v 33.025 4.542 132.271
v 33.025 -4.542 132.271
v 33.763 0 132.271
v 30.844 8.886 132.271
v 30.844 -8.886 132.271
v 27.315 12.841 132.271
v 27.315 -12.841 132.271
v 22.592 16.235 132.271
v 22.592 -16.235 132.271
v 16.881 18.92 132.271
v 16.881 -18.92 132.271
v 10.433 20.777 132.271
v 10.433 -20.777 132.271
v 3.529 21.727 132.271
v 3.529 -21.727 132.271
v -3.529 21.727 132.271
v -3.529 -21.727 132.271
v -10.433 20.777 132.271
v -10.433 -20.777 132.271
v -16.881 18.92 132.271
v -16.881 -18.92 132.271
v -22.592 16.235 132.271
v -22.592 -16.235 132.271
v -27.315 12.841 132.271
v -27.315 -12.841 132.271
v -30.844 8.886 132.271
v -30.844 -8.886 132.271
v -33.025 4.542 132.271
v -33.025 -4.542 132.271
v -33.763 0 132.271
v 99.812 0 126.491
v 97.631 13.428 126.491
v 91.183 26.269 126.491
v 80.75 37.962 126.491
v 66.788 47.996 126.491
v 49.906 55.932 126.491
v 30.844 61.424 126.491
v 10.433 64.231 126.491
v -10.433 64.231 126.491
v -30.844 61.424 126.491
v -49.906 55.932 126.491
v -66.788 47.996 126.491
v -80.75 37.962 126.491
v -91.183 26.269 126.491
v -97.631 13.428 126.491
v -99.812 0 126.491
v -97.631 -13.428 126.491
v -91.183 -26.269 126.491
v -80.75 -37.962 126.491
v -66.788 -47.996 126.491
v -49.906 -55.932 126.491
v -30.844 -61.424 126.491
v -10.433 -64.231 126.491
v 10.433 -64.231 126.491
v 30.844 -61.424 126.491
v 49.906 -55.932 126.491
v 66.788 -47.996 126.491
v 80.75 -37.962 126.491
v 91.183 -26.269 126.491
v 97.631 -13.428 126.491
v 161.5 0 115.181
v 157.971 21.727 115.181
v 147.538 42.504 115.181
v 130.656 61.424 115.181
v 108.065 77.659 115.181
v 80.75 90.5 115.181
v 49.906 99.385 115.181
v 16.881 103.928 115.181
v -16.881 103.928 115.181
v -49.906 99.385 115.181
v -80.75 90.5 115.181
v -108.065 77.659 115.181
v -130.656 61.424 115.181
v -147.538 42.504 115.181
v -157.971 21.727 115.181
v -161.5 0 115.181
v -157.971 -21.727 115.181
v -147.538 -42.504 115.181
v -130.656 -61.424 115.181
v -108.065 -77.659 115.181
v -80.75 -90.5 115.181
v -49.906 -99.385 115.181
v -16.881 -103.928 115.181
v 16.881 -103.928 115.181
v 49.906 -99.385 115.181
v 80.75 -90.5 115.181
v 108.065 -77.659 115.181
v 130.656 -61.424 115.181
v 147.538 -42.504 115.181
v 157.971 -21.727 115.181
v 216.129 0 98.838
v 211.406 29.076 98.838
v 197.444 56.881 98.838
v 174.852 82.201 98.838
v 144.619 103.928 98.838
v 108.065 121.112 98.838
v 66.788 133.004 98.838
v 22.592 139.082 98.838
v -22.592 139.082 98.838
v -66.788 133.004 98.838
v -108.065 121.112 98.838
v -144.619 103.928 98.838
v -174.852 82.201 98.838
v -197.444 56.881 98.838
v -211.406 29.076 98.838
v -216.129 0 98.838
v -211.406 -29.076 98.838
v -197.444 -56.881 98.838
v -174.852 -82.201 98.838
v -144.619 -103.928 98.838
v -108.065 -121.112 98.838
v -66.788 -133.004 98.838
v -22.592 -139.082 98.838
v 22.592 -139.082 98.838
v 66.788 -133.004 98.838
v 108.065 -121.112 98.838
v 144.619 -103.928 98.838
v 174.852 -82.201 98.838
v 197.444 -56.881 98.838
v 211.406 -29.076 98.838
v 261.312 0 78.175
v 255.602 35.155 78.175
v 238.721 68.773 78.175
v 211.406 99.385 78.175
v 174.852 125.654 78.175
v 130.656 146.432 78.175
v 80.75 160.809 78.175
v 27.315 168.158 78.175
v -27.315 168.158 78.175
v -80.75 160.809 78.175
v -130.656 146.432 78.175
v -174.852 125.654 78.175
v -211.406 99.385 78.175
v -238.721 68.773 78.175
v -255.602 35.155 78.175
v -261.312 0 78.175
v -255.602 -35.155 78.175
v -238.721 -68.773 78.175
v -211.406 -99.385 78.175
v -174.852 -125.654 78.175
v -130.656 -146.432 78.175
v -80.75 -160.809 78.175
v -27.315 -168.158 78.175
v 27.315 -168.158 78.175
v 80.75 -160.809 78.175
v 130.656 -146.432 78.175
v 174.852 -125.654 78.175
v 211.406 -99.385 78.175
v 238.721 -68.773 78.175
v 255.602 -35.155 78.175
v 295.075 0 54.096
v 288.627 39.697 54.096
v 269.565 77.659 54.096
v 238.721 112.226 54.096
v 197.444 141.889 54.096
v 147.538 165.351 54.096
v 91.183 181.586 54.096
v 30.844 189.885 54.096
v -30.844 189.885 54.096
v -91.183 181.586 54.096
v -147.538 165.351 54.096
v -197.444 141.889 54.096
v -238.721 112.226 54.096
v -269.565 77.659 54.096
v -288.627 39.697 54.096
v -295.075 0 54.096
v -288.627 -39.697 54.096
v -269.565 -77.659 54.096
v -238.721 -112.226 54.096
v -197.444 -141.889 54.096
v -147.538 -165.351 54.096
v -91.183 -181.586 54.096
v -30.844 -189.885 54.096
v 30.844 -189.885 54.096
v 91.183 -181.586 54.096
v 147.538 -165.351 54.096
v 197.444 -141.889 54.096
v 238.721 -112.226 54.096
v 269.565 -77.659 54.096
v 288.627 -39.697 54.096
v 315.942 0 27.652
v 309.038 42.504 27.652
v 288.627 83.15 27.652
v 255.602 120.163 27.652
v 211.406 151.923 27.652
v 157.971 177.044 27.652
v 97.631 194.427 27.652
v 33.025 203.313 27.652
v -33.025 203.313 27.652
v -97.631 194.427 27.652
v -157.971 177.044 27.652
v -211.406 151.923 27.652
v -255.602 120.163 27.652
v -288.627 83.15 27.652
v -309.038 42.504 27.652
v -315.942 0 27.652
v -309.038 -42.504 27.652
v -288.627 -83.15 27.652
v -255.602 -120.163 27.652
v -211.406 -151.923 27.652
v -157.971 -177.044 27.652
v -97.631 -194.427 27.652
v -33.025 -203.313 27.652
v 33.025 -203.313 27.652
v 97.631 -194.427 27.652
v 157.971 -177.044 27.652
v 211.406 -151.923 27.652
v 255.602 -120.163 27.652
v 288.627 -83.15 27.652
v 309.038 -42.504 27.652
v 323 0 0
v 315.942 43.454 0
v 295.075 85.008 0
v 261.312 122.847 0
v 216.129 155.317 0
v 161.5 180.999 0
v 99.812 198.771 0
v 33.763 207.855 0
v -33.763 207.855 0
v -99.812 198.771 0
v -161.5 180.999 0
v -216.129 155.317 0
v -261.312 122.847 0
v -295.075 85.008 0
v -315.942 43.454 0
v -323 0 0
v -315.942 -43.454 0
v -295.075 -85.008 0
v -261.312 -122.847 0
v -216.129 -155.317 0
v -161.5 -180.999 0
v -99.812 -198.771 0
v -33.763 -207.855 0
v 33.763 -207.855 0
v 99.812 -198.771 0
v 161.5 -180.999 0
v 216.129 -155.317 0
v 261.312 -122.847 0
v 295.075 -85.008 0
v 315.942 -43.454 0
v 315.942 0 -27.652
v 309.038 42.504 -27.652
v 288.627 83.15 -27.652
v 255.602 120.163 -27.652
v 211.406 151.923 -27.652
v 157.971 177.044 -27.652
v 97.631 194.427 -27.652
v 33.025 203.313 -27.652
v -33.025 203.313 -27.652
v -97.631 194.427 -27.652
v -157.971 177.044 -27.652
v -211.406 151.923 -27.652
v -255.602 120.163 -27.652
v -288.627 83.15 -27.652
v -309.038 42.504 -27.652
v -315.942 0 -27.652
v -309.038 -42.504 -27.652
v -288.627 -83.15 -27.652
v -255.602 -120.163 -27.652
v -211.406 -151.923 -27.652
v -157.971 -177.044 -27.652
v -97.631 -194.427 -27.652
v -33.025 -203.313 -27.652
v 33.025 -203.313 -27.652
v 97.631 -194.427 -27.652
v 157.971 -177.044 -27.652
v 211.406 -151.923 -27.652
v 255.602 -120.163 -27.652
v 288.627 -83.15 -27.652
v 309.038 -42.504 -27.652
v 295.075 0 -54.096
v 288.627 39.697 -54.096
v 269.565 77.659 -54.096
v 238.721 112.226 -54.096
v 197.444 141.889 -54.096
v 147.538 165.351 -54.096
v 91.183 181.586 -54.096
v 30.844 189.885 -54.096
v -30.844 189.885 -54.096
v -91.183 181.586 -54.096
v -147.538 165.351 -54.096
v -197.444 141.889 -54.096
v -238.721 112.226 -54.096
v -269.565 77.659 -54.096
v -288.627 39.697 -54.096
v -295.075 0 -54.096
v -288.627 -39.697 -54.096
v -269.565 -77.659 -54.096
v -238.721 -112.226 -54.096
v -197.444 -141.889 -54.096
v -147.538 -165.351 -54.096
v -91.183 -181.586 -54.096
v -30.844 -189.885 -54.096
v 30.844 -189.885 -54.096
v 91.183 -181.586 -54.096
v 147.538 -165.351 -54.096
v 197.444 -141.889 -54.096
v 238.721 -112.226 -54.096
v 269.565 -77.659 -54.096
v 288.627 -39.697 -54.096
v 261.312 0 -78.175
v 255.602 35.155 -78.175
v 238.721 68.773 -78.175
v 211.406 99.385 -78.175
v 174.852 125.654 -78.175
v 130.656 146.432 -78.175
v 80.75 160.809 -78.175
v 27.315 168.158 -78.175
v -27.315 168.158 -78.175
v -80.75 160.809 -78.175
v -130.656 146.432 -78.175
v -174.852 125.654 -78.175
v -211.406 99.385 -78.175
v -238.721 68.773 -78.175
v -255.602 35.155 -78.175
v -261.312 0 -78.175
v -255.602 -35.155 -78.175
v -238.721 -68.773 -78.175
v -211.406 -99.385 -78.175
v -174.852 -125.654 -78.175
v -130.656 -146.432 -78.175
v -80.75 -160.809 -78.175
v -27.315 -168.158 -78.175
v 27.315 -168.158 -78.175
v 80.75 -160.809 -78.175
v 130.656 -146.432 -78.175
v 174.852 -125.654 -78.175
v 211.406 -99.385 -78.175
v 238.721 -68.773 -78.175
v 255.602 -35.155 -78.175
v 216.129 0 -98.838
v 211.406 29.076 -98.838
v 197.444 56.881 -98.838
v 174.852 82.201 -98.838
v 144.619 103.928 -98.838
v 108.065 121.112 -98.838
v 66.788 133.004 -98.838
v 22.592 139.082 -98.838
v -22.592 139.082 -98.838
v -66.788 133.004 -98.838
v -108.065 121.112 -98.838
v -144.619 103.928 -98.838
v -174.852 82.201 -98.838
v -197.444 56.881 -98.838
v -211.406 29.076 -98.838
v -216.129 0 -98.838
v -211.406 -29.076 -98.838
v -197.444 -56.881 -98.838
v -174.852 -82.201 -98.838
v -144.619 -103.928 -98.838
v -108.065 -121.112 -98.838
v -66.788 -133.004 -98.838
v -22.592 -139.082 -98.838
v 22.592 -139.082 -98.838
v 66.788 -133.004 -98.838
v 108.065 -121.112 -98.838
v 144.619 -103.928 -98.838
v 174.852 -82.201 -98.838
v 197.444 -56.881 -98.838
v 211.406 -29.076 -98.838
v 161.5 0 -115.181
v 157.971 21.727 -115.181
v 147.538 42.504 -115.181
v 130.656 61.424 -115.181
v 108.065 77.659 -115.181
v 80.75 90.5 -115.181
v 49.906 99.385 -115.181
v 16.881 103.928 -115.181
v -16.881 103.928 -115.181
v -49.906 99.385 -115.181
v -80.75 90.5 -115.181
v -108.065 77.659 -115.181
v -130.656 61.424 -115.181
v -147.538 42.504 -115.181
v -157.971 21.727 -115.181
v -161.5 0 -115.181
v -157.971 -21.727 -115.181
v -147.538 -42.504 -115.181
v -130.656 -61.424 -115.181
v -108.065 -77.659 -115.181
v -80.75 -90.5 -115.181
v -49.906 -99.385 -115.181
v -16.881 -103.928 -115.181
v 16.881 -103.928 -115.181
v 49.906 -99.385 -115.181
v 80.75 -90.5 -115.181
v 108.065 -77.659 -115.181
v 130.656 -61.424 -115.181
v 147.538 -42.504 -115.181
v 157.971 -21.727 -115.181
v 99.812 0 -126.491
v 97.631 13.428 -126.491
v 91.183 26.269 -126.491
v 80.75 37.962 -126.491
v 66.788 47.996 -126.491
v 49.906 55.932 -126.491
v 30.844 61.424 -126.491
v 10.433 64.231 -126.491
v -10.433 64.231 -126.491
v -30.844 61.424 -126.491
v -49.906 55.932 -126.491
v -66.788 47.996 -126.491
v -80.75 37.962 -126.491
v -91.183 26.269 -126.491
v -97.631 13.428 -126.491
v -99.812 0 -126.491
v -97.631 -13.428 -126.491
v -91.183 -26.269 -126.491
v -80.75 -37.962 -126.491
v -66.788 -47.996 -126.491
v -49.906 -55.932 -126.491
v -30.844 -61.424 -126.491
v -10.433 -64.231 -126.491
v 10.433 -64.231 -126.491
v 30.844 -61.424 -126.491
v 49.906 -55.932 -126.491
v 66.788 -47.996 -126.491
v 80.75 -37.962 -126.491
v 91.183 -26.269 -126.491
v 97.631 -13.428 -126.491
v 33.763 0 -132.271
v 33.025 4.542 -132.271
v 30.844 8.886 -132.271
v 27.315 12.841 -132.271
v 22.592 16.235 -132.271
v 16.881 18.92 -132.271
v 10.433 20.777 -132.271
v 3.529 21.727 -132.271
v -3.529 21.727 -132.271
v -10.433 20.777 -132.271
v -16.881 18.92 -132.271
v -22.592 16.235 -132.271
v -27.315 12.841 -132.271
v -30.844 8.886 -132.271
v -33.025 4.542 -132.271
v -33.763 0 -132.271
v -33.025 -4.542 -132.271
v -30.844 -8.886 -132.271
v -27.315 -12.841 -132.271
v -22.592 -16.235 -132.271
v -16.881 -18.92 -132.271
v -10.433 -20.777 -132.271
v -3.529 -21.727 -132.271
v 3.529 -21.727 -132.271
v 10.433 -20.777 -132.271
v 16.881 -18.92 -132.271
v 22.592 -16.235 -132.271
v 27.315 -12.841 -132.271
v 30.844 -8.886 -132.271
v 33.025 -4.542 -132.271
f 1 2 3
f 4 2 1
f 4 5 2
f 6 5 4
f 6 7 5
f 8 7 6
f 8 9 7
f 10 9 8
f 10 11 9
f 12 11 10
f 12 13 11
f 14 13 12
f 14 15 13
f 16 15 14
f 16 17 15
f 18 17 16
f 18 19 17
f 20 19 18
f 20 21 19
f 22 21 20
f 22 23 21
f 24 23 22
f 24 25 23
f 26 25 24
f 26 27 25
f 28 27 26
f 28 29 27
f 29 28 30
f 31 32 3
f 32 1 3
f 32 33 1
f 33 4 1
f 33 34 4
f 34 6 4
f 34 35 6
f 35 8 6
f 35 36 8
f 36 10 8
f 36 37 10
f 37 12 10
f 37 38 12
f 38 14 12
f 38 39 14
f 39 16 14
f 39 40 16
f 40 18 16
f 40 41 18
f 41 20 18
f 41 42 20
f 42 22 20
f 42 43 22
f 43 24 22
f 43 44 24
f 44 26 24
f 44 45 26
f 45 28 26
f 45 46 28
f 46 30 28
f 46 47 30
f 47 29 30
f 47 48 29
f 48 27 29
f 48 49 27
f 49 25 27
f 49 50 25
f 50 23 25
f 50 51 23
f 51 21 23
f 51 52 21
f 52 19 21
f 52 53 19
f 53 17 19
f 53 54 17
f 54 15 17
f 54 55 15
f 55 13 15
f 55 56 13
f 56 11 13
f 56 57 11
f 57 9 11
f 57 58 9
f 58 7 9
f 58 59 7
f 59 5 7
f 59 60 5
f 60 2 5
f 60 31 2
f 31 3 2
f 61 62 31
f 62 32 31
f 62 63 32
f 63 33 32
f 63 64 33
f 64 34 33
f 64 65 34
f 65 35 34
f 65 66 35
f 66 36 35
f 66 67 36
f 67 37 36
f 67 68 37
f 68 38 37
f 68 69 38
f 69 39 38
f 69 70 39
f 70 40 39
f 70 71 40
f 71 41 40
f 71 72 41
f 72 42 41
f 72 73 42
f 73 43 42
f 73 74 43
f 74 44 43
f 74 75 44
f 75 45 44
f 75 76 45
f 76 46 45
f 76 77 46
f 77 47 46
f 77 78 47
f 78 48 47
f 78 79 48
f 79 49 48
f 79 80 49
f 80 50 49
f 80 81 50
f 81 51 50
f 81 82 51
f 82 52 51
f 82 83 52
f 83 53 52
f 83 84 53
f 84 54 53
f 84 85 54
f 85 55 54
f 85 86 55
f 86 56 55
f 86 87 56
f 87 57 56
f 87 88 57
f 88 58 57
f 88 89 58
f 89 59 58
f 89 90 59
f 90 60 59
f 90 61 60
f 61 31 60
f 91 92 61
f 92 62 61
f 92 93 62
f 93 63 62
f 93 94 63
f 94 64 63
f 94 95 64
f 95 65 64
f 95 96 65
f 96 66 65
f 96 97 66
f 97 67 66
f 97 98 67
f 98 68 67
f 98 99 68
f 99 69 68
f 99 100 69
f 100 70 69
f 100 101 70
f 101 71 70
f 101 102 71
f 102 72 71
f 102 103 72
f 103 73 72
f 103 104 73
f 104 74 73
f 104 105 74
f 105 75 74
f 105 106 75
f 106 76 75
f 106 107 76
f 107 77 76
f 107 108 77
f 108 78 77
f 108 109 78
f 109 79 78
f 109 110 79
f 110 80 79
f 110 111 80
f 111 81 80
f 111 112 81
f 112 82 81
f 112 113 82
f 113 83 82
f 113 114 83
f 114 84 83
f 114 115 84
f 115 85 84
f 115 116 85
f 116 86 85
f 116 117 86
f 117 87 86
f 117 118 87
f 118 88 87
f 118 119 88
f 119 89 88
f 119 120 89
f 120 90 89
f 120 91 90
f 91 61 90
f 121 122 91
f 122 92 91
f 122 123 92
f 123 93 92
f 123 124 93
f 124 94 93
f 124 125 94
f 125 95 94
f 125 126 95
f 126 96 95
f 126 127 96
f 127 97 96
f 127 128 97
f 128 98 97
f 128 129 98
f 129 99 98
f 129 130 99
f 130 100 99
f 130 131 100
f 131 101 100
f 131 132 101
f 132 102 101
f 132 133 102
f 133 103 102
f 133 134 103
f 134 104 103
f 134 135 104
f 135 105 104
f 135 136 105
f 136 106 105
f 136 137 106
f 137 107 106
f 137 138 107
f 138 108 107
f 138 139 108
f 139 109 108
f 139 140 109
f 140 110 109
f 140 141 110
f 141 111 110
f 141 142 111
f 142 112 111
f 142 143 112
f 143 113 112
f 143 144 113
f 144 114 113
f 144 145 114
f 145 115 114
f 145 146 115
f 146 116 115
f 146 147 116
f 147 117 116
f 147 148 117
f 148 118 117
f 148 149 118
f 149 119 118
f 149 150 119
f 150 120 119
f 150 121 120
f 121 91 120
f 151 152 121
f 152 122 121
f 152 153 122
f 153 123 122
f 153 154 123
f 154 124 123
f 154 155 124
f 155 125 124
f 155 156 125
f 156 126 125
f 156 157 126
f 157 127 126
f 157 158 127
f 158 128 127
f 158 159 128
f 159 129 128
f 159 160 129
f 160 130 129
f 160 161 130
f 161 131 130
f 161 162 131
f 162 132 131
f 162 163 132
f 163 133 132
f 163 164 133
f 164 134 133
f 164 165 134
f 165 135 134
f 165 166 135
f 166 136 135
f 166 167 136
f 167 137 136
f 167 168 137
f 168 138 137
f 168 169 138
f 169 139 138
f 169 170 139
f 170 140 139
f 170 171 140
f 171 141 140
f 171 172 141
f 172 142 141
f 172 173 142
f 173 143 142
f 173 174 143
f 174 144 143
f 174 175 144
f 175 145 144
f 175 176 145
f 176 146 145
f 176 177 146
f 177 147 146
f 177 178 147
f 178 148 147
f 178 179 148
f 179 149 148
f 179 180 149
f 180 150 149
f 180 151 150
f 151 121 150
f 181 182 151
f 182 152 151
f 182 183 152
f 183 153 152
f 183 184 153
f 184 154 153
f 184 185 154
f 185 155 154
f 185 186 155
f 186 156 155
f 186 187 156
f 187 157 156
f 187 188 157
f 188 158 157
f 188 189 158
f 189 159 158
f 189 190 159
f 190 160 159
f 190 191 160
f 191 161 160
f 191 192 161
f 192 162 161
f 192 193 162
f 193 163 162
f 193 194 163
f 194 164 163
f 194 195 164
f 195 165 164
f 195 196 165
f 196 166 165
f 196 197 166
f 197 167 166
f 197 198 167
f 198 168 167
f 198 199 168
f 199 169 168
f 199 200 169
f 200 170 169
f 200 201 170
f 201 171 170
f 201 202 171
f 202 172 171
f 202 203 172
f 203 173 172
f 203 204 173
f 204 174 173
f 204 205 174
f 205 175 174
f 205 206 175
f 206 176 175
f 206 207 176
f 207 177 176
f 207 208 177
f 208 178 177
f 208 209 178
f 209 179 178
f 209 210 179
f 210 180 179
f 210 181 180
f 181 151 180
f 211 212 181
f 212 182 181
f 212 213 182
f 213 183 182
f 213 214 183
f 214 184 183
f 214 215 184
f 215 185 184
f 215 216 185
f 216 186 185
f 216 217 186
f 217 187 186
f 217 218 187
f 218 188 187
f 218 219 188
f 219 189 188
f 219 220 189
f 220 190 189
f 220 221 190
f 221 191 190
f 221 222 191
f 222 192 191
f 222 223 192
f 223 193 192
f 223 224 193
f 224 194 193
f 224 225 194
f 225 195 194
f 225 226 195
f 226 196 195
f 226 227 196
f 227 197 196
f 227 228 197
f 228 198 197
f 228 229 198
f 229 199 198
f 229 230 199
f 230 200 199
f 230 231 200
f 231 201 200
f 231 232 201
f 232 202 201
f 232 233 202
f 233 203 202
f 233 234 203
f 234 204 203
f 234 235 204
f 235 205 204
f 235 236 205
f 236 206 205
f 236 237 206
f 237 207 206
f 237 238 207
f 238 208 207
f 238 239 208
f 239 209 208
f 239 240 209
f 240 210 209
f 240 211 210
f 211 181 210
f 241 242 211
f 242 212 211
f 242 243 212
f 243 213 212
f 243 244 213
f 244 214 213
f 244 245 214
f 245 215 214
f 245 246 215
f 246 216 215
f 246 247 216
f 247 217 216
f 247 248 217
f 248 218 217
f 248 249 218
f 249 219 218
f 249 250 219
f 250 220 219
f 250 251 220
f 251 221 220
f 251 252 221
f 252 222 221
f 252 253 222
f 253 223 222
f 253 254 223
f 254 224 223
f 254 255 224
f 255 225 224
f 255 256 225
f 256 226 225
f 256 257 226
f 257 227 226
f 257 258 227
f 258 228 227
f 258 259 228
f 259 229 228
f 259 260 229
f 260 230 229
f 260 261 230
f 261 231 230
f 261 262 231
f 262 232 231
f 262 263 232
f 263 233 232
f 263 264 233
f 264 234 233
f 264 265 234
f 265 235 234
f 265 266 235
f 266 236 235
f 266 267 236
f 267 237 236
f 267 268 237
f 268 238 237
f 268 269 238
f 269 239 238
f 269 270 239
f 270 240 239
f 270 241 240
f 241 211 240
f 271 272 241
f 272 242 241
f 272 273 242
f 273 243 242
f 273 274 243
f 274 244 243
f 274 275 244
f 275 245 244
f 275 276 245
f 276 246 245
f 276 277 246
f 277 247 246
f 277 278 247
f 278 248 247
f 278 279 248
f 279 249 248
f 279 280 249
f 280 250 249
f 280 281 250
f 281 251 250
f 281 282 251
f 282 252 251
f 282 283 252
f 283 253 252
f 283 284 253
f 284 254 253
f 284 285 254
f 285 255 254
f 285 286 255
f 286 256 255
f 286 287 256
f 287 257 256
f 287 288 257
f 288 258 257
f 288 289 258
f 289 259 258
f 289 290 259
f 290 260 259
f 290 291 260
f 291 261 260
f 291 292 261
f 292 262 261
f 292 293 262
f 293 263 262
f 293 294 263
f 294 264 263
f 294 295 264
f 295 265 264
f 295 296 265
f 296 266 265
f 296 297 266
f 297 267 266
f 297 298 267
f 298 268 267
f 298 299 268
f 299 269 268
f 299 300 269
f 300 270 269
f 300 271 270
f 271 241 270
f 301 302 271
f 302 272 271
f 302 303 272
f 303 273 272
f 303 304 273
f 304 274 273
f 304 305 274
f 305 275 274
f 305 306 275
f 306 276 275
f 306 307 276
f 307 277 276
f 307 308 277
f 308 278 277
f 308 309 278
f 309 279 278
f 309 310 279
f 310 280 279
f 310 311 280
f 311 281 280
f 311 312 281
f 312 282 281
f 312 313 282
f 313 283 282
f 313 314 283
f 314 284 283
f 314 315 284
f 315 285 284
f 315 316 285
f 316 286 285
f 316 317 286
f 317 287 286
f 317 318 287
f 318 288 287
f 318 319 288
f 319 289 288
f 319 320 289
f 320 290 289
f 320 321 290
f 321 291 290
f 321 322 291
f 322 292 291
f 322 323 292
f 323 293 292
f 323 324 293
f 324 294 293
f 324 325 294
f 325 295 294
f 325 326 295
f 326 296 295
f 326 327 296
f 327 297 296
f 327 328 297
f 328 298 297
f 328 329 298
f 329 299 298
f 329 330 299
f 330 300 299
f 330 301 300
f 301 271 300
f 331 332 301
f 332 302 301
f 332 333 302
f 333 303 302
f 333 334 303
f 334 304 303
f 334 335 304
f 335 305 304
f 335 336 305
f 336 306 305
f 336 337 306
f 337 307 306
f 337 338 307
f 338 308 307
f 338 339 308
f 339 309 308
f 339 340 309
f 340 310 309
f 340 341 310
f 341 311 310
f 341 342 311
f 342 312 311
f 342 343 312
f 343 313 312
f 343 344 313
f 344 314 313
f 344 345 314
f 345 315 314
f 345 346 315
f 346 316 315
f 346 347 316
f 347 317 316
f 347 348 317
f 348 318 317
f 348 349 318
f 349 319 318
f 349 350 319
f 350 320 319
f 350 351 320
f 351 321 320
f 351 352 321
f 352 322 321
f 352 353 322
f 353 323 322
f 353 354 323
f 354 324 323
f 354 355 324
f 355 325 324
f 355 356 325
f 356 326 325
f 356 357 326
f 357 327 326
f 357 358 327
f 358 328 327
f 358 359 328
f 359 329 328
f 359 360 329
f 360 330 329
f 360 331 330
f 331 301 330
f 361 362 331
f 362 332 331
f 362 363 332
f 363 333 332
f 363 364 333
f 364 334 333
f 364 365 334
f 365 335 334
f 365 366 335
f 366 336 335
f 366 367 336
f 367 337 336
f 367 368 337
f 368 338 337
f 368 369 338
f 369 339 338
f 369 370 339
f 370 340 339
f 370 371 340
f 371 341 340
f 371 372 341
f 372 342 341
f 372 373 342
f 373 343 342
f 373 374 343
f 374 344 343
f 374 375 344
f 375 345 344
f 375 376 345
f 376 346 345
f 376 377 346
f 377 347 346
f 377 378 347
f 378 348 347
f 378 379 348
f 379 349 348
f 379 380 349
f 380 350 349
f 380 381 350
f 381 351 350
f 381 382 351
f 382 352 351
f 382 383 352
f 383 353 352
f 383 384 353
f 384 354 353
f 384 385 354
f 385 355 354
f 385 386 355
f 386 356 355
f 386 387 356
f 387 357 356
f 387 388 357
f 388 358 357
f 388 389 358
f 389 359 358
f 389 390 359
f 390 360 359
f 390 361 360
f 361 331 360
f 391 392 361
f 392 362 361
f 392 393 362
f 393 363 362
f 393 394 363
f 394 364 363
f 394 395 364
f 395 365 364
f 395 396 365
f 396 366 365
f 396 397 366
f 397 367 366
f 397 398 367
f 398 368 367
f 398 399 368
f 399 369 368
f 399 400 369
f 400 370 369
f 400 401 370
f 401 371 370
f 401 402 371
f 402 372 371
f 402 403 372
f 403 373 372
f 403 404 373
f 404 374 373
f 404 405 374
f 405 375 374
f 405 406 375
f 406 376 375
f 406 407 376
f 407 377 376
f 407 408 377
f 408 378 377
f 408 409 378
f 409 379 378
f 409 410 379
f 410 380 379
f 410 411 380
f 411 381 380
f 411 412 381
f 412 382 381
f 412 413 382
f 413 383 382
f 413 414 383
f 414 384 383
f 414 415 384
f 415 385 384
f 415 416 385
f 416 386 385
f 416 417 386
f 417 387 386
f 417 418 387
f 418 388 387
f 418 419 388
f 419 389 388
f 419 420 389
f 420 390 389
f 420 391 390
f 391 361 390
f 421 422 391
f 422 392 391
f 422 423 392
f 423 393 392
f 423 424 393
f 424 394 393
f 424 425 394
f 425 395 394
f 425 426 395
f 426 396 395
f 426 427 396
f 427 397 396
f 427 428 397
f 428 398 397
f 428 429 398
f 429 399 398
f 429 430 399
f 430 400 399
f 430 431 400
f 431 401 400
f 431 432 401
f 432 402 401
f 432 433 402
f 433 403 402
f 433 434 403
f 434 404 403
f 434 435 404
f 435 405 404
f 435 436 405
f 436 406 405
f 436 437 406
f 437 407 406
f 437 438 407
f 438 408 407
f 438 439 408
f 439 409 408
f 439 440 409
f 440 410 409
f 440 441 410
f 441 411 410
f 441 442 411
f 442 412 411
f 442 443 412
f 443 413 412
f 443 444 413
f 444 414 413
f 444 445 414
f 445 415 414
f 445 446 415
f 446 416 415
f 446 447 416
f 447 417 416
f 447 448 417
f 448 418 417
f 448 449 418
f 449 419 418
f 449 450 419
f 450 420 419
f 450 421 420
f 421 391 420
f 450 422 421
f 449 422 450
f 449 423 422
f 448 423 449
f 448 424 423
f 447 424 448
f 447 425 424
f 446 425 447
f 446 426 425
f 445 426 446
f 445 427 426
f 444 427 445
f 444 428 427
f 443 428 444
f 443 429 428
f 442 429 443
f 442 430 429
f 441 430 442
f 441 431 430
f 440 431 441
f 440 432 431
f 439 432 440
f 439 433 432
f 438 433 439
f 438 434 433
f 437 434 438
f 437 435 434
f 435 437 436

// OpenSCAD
// Generated by SolidPython 1.0.1 on 2020-07-29 00:46:53


scale(v = [17, 11, 7]) {
	sphere(r = 19);
}
/***********************************************
*********      SolidPython code:      **********
************************************************
 
# import packages: SolidPython
from solid import *
from solid.utils import *
from itertools import chain, combinations, permutations


class Resize:

    def __init__(self, scad_file):
        self.scad_file = scad_file
        #self.scad_file = import_scad(scad_file)
        # cone/cylinder param:
        self.r1 = 0
        self.r2 = 0
        self.h = 0
        # rectangular prism param:
        self.w = 0
        self.l = 0
        # ellipse param:
        self.r = 0

    # import OpenScad code (file name corresponds to shape)


    # classify shape + parameters
    def assign(self, param1, param2, param3):
        if self.scad_file == 'cone.scad':
            self.r1 = param1
            self.r2 = param2
            self.h = param3
        elif self.scad_file == 'cylinder.scad':
            self.r1 = param1
            self.r2 = param2
            self.h = param3
        elif self.scad_file == 'rectangularPrism.scad':
            self.h = param1
            self.l = param2
            self.w = param3
        else:
            self.r = param1
            self.h = param2

    # resize parameters
    def iterate(self):
        x = range(3, 20, 2)
        i = 1
        if self.scad_file == 'cone.scad':
            tempList = list(permutations(x, 2))
            for temp in tempList:
                param1 = temp[0]
                param2 = temp[1]
                filepath = 'produced_scad_files/' + 'cone' + str(param1) + '_' + str(param2) + '_' + '.scad'
                scad_render_to_file(cylinder(h=param1, r1=param2, r2=0), filepath)

        elif self.scad_file == 'cylinder.scad':
            tempList = list(permutations(x, 3))
            for temp in tempList:
                param1 = temp[0]
                param2 = temp[1]
                filepath = 'produced_scad_files/' + 'cylinder' + str(param1) + '_' + str(param2) + '_' + '.scad'
                scad_render_to_file(cylinder(h=param1, r1=param2, r2=param2), filepath)

        elif self.scad_file == 'rectangularPrism.scad':
            tempList = list(permutations(x, 3))
            for temp in tempList:
                param1 = temp[0]
                param2 = temp[1]
                param3 = temp[2]
                filepath = 'produced_scad_files/' + 'rectangularPrism' + str(param1) + '_' + str(param2) + '_' + str(
                    param3) + '.scad'
                scad_render_to_file(cube(size=(param1, param2, param3)), filepath)

        elif self.scad_file == 'ellipse.scad':
            tempList = list(permutations(x, 4))
            for temp in tempList:
                param1 = temp[0]
                param2 = temp[1]
                param3 = temp[2]
                param4 = temp[3]
                filepath = 'produced_scad_files/' + 'ellipse' + str(param1) + '_' + str(param2) + '_' + str(param3) + '_' + str(param4) + '.scad'
                scad_render_to_file(scale([param1, param2, param3])(sphere(r=param4)), filepath)

    def render_to_scadfile(self):
        scad_render_to_file(scad, 'example.scad') 
 
************************************************/
